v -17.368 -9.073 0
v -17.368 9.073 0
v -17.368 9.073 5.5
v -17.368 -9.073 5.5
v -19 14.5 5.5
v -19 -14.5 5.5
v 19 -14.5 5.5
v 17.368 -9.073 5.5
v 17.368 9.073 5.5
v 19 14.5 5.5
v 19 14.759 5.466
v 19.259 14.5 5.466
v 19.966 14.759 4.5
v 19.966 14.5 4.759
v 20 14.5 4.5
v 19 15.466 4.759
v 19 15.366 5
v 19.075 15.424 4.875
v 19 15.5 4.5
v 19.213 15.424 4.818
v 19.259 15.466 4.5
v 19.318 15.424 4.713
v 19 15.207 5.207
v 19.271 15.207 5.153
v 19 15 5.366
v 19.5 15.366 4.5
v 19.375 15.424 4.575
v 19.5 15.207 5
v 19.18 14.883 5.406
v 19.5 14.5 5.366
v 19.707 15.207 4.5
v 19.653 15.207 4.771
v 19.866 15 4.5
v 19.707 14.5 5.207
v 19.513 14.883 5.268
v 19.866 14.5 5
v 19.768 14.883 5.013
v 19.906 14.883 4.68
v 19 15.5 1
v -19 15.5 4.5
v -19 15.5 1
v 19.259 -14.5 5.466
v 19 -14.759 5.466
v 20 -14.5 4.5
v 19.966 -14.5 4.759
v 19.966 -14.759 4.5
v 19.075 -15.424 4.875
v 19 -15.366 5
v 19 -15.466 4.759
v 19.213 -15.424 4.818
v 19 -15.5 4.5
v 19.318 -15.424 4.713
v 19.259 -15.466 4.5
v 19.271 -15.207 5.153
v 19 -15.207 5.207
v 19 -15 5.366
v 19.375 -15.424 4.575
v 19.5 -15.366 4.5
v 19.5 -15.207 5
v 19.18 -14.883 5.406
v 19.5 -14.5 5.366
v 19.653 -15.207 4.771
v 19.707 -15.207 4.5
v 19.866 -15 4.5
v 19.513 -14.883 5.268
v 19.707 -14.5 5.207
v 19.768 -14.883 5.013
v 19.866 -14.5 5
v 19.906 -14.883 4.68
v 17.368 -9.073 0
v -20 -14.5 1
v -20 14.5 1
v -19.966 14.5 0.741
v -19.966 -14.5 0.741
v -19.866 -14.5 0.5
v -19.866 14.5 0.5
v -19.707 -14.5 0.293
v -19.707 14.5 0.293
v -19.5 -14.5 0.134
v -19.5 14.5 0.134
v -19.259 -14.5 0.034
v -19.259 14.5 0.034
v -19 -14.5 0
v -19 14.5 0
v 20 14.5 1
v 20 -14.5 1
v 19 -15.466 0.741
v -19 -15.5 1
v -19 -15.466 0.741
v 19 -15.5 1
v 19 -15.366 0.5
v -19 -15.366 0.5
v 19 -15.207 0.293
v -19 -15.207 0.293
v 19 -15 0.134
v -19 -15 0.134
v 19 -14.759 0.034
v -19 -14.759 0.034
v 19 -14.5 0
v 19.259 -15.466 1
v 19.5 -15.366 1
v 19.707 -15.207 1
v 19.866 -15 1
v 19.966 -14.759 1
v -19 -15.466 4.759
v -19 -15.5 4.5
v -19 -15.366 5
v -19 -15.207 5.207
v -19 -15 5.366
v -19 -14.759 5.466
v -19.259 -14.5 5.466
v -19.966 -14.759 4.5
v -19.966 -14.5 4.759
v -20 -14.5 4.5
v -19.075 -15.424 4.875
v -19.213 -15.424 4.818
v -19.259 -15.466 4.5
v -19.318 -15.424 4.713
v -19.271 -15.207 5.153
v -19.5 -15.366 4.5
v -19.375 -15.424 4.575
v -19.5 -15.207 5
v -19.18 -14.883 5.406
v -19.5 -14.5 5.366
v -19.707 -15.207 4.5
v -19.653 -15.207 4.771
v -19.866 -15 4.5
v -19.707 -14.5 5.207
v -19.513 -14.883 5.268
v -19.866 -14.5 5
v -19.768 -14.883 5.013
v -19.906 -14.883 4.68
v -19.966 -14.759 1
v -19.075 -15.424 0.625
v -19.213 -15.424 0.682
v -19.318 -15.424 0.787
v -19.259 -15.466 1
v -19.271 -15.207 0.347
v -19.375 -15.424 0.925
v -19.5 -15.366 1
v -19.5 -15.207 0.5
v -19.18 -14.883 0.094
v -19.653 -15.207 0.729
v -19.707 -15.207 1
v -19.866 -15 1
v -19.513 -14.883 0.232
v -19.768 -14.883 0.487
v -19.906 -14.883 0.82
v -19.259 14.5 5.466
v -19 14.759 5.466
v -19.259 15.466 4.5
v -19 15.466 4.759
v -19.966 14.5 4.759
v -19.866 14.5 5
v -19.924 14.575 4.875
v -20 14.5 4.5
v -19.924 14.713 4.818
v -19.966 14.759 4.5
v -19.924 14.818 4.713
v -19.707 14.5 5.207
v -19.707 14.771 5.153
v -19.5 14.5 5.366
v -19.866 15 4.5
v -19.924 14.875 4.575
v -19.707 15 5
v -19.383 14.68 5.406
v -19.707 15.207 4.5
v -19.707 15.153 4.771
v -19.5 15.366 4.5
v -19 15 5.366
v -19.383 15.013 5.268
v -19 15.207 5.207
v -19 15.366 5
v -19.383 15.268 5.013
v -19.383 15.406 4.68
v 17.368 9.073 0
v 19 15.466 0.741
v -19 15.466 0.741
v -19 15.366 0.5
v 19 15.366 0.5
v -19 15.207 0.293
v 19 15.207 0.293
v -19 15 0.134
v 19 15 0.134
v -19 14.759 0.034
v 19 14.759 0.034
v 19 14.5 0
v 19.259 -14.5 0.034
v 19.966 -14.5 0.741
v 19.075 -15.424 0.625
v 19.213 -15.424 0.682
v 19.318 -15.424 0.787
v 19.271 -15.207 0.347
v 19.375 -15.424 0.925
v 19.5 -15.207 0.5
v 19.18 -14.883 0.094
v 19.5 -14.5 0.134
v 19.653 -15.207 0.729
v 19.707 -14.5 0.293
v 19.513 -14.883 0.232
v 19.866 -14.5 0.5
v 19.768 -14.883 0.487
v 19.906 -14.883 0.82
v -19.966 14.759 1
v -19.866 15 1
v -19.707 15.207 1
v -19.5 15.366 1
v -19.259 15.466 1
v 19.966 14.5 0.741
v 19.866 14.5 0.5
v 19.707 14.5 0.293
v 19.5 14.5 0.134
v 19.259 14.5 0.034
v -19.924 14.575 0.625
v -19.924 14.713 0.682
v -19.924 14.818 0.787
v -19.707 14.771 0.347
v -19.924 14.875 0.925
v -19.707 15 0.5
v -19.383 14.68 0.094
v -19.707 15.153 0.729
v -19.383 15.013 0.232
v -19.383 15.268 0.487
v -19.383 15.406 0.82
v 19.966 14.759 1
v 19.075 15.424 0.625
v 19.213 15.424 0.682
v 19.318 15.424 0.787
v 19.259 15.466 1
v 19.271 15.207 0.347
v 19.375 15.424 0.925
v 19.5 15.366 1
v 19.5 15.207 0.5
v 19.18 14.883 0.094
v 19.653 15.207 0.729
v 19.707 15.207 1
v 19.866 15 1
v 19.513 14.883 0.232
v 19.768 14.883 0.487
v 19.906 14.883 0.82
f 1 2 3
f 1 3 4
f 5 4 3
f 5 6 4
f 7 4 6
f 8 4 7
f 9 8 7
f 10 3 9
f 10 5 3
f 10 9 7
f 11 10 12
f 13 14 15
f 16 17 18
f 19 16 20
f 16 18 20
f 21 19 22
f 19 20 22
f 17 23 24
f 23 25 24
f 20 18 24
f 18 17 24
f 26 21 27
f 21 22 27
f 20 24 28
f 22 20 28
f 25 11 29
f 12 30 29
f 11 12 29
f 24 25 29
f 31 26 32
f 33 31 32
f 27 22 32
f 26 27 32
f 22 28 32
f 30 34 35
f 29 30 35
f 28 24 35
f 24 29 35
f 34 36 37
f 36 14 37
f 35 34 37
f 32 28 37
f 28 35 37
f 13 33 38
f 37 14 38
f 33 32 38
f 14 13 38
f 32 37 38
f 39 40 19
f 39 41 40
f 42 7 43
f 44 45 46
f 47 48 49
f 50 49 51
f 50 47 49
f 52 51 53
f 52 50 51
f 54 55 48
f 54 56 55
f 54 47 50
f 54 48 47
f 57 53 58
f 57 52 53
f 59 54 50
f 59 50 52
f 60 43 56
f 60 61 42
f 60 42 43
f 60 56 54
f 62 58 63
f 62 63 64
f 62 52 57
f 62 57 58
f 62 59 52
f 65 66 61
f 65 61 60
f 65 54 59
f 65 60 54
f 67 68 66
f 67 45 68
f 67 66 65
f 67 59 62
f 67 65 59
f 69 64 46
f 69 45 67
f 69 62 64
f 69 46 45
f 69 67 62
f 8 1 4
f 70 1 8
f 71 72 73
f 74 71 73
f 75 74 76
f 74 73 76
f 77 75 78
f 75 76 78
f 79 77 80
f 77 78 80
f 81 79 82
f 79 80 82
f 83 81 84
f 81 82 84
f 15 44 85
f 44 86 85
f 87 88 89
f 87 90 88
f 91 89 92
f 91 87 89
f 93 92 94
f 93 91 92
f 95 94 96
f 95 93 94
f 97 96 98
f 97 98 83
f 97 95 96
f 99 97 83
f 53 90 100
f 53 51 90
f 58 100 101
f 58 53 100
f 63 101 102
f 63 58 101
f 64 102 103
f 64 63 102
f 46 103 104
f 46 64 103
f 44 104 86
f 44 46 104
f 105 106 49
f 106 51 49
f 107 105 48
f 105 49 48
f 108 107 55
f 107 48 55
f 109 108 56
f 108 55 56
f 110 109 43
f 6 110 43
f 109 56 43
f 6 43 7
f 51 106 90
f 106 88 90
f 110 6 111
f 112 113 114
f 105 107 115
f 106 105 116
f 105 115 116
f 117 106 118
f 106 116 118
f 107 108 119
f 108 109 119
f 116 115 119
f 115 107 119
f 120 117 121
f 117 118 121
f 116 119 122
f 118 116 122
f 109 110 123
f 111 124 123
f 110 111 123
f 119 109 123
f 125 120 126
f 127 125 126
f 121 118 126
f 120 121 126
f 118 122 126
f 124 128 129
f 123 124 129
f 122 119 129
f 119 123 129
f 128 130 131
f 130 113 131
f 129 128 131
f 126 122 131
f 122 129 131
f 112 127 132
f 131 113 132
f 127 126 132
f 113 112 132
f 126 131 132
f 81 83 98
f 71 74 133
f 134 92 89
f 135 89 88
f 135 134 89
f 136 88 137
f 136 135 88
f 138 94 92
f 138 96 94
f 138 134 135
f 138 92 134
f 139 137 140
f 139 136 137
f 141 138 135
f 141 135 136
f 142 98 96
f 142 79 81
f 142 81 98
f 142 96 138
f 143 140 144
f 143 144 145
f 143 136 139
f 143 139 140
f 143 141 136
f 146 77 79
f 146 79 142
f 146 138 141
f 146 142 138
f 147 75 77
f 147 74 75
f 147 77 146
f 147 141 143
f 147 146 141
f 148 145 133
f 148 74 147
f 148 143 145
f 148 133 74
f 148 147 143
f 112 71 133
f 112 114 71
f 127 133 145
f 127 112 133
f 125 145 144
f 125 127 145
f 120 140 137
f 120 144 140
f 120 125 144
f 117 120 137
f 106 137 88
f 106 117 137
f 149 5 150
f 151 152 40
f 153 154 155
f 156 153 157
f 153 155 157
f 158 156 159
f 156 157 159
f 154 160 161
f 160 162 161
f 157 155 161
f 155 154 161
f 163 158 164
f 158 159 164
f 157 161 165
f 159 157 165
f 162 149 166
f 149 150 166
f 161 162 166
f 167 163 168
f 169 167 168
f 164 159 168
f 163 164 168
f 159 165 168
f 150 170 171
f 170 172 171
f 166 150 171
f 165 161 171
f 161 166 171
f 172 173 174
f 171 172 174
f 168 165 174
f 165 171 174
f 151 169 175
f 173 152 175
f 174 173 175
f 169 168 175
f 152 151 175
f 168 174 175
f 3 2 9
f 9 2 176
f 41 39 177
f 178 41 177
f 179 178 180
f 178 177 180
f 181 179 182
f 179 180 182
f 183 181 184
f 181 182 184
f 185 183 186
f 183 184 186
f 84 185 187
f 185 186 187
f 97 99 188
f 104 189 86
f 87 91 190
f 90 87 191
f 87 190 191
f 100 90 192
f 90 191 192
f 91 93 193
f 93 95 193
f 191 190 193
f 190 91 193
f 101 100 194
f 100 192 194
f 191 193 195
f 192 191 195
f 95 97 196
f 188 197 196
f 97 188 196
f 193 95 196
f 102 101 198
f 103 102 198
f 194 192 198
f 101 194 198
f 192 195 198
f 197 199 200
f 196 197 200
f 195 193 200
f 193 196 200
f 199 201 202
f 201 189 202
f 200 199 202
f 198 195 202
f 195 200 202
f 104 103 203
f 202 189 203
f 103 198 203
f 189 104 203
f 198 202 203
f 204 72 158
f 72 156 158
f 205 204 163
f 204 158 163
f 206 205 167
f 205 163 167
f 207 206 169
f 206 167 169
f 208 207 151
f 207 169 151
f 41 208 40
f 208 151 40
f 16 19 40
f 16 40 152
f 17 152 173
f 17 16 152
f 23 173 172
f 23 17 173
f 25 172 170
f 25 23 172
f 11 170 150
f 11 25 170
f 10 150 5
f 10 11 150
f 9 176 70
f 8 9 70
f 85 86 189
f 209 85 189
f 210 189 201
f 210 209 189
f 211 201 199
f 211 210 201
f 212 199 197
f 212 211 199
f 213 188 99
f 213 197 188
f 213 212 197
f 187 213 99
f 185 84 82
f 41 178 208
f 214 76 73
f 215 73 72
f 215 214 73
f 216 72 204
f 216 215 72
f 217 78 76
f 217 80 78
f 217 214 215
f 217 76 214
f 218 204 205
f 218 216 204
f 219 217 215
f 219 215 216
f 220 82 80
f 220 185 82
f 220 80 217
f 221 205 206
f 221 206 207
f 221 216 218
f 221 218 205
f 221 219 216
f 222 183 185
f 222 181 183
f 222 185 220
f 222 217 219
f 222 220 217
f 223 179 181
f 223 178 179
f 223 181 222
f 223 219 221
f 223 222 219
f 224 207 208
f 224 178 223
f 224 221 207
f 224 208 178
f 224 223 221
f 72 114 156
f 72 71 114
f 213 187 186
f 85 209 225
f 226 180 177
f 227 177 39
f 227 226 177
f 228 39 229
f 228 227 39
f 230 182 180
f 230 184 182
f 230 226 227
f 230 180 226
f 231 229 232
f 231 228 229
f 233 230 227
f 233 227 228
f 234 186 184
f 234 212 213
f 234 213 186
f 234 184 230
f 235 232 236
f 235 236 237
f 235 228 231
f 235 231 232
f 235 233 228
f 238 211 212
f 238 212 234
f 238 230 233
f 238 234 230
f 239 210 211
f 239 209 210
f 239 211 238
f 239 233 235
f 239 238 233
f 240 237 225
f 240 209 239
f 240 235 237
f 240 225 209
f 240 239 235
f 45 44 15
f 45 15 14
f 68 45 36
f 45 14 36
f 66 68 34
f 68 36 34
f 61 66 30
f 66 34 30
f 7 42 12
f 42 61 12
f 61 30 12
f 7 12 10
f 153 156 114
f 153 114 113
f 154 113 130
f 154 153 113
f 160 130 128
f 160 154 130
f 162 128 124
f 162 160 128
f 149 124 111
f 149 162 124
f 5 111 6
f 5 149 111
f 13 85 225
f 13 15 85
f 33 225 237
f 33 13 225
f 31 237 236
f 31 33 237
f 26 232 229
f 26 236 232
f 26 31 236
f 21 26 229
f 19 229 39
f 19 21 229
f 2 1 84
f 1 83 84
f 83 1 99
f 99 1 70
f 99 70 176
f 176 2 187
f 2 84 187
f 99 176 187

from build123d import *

# Parameters (mm, degrees)
F0_W     = 40
F0_H     = 31
F1_DEPTH = 5.5
F2_R     = 1
F3_W     = 34.735498
F3_H     = 18.146572
F4_DEPTH = 25


with BuildPart() as f1:
    # F0 (on Top) → F1 (new body)
    with BuildSketch(Plane.XY):
        Rectangle(F0_W, F0_H)
    extrude(amount=F1_DEPTH)

    # F2
    f2_edges = [f1.edges().sort_by_distance(p)[0] for p in [
        (20, 0, 5.5),
        (0, 15.5, 5.5),
        (-20, 0, 5.5),
        (0, -15.5, 5.5),
        (20, 0, 0),
        (0, 15.5, 0),
        (-20, 0, 0),
        (0, -15.5, 0),
        (-20, -15.5, 2.75),
        (20, -15.5, 2.75),
        (-20, 15.5, 2.75),
        (20, 15.5, 2.75),
    ]]
    fillet(f2_edges, radius=F2_R)

    # F3 (on face) → F4 (cut)
    with BuildSketch(Plane(origin=(0, 0, 0), x_dir=(1, 0, 0), z_dir=(0, 0, -1))):
        Rectangle(F3_W, F3_H)
    extrude(amount=-F4_DEPTH, mode=Mode.SUBTRACT)


solid = f1.part
